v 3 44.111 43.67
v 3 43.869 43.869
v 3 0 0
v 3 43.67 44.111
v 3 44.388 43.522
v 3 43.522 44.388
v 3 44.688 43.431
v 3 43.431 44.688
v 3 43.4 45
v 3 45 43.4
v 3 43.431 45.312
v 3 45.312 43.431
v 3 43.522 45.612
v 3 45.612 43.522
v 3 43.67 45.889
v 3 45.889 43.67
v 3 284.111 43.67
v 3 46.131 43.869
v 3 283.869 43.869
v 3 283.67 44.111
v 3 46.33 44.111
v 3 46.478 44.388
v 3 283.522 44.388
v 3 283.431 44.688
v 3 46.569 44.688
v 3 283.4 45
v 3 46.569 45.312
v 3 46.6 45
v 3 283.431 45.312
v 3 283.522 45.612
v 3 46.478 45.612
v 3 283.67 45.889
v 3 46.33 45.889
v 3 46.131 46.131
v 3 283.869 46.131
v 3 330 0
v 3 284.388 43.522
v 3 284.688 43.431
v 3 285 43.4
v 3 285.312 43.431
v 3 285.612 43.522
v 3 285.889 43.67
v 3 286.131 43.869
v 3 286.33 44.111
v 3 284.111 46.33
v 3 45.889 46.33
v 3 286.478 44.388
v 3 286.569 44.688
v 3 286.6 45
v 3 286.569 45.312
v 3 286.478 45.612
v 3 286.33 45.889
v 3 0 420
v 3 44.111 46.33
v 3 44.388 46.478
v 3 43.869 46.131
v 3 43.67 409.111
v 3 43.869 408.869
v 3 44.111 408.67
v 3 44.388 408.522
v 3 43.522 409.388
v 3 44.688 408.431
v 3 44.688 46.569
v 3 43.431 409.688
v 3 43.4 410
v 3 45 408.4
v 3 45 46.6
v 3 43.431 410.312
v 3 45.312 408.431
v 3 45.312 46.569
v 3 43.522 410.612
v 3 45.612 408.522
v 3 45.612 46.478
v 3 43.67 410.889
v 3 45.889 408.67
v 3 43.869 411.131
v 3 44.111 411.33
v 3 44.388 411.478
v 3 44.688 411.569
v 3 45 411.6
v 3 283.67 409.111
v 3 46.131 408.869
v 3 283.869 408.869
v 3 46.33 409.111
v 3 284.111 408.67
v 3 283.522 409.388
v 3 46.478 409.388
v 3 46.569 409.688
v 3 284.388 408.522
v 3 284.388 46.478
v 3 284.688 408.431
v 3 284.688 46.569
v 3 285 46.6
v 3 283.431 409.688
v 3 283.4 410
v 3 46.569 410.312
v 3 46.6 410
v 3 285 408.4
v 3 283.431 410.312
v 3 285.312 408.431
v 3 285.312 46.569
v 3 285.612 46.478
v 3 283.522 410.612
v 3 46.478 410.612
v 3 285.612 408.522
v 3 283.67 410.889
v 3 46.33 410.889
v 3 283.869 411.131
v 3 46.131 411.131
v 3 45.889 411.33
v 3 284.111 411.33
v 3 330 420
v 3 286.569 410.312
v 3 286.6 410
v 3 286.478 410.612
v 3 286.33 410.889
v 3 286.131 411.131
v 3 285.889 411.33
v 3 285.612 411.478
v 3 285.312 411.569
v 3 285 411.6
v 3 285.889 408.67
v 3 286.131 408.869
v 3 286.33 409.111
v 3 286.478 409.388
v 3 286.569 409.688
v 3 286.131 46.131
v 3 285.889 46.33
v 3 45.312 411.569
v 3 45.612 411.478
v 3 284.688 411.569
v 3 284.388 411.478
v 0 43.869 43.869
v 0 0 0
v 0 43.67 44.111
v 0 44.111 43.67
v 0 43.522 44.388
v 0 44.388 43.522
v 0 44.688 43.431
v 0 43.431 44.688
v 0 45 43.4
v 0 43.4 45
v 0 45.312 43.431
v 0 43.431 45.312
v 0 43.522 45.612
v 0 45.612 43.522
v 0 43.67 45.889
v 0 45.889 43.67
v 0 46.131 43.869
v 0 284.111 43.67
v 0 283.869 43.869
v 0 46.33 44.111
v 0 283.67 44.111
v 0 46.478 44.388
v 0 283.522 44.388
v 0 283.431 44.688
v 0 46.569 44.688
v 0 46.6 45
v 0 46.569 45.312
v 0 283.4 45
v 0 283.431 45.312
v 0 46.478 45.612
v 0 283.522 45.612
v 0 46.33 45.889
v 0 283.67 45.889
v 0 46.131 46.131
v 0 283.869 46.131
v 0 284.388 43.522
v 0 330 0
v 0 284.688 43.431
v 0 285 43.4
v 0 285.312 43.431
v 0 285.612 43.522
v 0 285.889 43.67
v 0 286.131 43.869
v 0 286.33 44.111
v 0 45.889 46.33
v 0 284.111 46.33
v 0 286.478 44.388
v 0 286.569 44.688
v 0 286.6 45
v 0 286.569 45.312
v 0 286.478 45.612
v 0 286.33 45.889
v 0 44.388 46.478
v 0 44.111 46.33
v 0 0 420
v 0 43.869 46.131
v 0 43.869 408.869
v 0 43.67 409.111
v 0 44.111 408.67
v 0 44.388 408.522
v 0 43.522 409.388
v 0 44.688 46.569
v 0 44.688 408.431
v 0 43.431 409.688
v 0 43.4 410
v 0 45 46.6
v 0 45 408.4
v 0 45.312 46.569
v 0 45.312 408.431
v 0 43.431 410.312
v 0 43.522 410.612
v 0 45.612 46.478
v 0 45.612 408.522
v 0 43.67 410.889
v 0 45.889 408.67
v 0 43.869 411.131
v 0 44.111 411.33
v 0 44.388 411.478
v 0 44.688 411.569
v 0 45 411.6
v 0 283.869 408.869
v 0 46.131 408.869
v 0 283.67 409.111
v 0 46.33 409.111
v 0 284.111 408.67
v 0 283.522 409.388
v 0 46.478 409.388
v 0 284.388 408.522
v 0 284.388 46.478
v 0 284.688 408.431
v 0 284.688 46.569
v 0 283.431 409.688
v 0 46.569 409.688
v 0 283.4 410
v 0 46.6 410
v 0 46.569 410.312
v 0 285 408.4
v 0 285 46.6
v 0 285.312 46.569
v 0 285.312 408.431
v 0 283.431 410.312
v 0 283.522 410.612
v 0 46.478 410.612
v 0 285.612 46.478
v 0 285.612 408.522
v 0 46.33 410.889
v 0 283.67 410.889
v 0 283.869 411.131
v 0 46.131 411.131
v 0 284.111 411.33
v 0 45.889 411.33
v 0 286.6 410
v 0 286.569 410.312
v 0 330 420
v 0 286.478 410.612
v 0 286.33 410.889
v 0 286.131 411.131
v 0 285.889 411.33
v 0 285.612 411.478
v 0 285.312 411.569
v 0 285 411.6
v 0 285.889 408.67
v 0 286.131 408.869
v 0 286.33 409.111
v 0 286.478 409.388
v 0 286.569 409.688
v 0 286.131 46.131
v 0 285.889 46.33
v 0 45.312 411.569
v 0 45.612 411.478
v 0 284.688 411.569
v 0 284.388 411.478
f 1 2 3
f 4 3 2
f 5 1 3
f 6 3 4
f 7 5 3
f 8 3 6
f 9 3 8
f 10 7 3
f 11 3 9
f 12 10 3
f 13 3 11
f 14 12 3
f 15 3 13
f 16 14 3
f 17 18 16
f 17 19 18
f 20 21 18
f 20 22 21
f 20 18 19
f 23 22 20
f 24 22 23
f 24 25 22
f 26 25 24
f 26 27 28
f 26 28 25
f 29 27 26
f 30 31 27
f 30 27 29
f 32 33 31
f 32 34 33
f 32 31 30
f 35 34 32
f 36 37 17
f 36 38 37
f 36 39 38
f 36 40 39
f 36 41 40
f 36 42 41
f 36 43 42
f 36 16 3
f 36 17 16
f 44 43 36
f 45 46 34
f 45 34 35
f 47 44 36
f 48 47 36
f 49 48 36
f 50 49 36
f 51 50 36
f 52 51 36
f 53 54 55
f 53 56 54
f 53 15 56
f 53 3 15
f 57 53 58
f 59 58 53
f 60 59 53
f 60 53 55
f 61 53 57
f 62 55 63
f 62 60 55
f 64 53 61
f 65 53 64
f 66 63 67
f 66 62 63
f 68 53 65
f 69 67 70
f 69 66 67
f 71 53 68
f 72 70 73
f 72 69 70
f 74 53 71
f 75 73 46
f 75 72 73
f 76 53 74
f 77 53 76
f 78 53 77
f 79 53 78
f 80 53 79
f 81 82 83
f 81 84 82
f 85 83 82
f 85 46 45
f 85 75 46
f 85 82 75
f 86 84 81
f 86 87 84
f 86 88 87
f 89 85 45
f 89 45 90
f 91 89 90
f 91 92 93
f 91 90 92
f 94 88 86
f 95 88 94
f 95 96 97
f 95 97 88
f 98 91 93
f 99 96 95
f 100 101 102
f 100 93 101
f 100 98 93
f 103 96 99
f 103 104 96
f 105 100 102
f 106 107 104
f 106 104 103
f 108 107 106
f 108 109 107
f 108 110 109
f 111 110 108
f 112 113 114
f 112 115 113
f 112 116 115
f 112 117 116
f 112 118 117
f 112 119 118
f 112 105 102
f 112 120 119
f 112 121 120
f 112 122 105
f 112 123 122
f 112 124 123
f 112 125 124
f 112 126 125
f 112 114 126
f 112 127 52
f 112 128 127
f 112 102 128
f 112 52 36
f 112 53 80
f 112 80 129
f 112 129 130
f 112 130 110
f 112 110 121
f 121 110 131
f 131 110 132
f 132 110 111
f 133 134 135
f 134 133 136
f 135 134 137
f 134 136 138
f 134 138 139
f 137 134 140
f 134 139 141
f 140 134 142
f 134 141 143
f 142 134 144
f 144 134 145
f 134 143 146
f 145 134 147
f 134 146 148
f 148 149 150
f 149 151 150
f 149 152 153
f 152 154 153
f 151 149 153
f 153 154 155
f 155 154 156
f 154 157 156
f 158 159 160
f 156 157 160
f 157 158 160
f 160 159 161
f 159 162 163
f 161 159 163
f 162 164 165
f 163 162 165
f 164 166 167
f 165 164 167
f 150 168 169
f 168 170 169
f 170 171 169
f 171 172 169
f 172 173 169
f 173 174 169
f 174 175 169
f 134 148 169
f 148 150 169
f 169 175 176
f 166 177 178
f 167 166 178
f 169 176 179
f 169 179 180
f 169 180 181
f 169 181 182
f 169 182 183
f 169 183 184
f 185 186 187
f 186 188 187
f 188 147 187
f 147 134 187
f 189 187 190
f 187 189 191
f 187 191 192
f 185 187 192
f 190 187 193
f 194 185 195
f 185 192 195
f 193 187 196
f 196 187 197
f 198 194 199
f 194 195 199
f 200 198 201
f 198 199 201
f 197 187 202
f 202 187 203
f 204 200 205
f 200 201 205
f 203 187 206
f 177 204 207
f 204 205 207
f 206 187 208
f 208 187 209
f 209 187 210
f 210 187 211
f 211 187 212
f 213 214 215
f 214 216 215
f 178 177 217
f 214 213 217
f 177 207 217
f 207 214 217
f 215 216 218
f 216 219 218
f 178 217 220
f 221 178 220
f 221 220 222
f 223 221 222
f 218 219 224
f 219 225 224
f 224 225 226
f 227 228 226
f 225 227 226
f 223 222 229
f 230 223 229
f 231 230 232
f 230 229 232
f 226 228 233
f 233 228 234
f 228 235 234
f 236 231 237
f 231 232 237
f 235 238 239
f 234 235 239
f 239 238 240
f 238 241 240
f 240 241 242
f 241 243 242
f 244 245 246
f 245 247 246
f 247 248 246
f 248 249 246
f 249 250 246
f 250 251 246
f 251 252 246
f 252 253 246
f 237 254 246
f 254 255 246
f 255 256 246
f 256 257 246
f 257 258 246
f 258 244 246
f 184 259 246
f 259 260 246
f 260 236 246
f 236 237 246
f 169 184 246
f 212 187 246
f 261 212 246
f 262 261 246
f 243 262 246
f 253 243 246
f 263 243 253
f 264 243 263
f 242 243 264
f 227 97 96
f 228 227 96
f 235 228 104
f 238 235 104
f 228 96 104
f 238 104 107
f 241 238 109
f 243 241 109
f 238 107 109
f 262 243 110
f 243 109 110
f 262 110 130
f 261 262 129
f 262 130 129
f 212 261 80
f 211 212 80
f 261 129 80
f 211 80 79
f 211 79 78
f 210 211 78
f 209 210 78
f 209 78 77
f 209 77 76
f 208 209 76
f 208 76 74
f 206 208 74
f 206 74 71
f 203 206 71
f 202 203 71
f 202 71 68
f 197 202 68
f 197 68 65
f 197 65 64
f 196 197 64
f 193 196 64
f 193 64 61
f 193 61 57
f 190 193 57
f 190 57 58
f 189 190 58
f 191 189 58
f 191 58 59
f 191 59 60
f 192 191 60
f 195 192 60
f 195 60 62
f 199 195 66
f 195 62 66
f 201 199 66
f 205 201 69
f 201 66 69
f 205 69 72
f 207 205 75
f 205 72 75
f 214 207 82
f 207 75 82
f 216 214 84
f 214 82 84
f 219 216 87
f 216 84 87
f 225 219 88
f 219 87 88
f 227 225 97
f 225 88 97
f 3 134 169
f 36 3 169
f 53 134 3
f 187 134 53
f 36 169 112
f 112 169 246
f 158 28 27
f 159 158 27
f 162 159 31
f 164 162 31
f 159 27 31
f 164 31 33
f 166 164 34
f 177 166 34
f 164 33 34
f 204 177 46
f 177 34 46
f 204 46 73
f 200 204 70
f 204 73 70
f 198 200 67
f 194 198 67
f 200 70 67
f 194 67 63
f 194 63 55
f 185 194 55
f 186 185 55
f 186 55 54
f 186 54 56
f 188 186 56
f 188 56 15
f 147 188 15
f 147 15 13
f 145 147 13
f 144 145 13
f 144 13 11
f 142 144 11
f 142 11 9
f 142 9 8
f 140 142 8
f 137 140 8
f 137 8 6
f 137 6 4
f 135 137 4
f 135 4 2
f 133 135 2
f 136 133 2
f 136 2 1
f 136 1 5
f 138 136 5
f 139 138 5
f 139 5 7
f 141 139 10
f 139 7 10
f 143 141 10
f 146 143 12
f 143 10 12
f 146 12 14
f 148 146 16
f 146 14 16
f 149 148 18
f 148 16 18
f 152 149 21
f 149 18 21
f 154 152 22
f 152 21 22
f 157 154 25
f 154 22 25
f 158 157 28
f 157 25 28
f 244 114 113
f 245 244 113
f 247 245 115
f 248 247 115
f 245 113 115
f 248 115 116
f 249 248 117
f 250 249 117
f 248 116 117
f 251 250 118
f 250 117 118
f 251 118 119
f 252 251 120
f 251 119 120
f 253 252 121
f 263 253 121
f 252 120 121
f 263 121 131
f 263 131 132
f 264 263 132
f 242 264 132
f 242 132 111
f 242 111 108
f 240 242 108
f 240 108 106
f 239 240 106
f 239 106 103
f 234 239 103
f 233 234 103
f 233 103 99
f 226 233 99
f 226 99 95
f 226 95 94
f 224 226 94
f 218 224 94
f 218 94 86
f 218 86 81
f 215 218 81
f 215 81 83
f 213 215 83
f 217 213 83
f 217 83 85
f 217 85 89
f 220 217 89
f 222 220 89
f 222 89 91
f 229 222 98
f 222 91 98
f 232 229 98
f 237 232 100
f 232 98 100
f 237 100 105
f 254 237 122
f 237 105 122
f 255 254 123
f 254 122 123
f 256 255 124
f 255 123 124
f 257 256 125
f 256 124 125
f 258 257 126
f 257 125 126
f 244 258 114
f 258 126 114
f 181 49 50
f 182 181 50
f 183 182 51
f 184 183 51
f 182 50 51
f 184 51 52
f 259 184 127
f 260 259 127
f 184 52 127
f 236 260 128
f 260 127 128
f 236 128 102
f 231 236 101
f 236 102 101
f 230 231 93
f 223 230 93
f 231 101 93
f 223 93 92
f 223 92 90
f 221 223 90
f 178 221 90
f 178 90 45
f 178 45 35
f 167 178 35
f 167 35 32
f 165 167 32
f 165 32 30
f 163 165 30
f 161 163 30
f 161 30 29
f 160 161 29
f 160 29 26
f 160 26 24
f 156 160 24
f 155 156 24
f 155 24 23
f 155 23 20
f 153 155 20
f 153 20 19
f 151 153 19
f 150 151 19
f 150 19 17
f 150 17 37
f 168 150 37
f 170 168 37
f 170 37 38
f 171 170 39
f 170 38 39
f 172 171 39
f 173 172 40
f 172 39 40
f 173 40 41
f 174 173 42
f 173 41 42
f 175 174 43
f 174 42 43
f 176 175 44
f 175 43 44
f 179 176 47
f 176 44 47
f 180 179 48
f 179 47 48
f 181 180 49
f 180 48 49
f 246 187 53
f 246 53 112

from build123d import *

# Parameters (mm, degrees)
SKETCH_W     = 330
SKETCH_H     = 420
PAD_DEPTH    = 3
SKETCH001_R  = 1.6
POCKET_DEPTH = 3.001


with BuildPart() as part:
    # Sketch → Pad (new body)
    with BuildSketch(Plane.YZ):
        with Locations((165, 210)):
            Rectangle(SKETCH_W, SKETCH_H)
    extrude(amount=PAD_DEPTH)

    # Sketch001 (on Face6 of Pad) → Pocket (cut, through all)
    with BuildSketch(Plane.YZ.offset(3)):
        with Locations((45, 410)):
            Circle(SKETCH001_R)
        with Locations((285, 410)):
            Circle(SKETCH001_R)
        with Locations((45, 45)):
            Circle(SKETCH001_R)
        with Locations((285, 45)):
            Circle(SKETCH001_R)
    extrude(amount=-POCKET_DEPTH, mode=Mode.SUBTRACT)


solid = part.part
